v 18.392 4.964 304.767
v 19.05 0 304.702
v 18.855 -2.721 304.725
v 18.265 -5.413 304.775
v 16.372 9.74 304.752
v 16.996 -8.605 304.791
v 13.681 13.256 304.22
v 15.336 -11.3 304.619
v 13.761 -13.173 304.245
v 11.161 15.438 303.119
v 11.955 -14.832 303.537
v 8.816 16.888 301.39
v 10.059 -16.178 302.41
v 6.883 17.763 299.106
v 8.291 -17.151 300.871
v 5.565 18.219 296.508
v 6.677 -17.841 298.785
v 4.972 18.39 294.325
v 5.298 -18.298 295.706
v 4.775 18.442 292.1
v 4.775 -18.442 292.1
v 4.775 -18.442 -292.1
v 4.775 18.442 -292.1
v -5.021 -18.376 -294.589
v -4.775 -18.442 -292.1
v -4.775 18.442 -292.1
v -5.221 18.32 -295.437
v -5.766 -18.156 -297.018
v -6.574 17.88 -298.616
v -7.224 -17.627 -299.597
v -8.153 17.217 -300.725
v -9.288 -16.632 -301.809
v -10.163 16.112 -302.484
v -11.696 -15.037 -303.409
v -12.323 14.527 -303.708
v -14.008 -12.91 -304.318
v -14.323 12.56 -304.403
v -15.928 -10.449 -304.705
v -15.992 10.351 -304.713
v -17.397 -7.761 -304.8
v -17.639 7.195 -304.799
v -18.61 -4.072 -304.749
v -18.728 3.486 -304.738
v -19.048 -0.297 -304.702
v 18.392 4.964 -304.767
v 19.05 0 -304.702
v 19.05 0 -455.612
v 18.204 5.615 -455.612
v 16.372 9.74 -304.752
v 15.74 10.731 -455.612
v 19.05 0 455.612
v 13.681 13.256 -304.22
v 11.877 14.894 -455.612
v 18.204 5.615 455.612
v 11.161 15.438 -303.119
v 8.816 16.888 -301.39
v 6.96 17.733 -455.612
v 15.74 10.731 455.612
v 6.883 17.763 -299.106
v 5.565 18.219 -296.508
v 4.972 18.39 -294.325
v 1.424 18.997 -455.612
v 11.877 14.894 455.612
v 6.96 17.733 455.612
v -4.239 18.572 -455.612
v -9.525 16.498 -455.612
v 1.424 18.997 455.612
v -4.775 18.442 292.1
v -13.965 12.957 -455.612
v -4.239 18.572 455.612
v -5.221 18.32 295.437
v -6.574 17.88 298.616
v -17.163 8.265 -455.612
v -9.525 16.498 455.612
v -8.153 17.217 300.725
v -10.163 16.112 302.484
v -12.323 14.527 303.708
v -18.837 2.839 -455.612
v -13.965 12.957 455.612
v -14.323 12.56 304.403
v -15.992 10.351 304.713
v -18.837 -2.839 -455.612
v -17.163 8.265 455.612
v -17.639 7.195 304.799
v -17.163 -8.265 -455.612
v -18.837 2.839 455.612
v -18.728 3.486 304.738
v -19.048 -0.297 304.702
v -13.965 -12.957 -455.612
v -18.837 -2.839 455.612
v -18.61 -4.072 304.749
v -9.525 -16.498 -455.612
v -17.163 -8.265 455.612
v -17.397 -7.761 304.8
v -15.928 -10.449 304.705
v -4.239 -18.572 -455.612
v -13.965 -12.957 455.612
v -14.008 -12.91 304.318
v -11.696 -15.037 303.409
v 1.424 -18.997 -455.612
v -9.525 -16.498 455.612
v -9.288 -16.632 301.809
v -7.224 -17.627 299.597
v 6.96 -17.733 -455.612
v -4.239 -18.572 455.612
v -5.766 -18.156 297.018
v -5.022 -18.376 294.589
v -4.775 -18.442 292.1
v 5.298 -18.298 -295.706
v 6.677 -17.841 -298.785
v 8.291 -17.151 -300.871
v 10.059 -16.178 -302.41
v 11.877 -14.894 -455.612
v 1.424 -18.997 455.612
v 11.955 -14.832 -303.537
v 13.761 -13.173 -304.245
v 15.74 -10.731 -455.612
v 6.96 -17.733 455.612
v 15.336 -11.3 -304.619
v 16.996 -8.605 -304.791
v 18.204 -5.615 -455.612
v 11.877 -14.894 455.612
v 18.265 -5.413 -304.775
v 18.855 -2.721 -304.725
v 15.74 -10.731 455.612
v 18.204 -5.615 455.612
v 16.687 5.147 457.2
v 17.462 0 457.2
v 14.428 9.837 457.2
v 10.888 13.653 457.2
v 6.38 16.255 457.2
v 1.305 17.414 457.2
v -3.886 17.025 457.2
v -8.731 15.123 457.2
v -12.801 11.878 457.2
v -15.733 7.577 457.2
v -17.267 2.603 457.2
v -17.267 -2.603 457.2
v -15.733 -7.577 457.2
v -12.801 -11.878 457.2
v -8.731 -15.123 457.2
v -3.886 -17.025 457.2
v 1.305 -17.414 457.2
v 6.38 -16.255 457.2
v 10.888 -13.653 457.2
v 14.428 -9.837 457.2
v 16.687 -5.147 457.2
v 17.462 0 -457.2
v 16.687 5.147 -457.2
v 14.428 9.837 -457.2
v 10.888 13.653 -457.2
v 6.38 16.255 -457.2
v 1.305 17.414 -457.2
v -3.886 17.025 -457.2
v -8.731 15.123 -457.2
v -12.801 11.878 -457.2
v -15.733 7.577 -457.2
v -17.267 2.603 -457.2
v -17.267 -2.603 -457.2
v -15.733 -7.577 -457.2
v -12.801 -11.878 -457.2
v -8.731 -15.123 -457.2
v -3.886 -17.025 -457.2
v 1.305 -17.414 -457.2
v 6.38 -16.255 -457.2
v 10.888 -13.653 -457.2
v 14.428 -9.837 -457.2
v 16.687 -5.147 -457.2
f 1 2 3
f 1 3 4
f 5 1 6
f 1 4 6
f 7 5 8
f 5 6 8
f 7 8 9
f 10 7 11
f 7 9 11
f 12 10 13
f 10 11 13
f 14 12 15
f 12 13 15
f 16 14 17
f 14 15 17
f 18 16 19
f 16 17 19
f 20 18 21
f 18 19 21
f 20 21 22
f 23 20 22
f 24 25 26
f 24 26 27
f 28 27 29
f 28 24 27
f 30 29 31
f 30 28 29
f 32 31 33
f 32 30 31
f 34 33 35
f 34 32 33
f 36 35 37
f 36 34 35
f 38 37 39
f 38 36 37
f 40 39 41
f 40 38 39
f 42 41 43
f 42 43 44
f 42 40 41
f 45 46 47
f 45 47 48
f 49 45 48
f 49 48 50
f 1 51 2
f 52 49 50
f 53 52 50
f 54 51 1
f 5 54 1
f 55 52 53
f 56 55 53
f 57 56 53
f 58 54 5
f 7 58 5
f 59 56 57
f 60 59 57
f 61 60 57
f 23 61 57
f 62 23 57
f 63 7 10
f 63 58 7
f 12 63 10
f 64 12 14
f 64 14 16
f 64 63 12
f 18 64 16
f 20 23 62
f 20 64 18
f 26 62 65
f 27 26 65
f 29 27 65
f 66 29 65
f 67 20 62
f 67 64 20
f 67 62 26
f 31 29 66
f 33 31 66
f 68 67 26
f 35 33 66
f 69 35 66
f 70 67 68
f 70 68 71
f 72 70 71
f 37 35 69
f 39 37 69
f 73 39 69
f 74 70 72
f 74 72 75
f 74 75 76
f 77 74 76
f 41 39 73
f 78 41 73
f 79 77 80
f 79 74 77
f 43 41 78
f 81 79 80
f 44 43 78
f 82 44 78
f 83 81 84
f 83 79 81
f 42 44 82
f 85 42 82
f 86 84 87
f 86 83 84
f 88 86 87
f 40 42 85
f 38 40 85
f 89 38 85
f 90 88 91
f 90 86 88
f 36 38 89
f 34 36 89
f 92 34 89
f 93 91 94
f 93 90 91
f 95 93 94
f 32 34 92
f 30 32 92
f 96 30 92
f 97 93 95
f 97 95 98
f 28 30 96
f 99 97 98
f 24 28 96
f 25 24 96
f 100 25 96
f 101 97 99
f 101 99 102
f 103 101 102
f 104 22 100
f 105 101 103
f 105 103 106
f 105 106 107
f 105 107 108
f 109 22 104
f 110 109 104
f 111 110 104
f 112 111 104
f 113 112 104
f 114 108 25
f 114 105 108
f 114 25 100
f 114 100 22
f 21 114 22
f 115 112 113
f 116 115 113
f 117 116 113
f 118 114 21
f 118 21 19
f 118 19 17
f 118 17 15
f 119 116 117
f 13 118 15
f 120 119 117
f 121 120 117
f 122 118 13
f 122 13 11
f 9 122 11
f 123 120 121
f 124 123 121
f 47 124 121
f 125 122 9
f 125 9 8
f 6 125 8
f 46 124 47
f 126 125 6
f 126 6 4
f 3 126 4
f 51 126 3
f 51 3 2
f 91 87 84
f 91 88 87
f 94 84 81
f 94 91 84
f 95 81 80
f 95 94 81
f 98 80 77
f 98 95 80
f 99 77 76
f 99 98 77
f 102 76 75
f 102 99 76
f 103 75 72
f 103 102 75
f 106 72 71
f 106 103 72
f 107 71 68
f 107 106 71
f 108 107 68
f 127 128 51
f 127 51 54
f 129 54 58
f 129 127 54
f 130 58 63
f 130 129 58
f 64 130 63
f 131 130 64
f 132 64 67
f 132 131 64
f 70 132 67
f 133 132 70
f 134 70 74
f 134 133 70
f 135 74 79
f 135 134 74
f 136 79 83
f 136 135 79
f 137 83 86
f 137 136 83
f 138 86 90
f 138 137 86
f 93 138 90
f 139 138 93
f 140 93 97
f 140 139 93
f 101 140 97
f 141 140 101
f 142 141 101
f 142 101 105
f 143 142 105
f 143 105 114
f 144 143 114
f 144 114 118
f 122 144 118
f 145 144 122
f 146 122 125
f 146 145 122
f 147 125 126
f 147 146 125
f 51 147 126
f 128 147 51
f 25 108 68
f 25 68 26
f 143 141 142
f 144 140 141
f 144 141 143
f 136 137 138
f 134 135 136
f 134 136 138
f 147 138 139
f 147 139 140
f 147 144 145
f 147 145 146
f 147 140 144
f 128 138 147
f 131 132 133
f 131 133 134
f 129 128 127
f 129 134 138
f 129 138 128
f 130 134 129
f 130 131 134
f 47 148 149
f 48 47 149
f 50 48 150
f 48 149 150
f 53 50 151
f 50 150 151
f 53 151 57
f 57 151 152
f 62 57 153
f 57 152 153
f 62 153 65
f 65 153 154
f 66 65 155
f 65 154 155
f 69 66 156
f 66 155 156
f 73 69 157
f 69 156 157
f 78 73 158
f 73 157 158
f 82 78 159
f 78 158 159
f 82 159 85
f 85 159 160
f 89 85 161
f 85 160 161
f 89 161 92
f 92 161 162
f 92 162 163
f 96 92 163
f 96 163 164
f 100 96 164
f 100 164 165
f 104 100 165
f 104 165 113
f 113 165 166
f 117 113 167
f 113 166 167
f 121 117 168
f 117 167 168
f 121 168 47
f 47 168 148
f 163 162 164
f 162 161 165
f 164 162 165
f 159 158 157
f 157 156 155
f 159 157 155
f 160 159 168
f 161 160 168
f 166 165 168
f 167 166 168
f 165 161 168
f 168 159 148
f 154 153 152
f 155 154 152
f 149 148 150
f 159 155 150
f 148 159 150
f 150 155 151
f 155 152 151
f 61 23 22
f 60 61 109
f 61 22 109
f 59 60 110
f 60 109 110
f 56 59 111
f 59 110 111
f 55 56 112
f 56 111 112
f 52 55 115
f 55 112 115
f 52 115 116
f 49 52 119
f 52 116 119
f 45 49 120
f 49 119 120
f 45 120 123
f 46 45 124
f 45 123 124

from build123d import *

# Parameters (mm, degrees)
F0_R     = 19.05
F1_DEPTH = 457.2
F2_SIZE2 = 1.5875
F2_SIZE  = 1.5875
F4_DEPTH = 19.05


# Not quite as in the source:
# - a pattern or mirror of a feature is missing from the dataset's text; its kind, count and spacing are read off the source's solid


with BuildPart() as f1:
    # F0 (on Top) → F1 (new body, symmetric)
    with BuildSketch(Plane.XY):
        Circle(F0_R)
    extrude(amount=F1_DEPTH, both=True)

    # F2
    f2_edges = [f1.edges().sort_by_distance(p)[0] for p in [
        (-19.05, 0, 457.2),
        (-19.05, 0, -457.2),
    ]]
    chamfer(f2_edges, length=F2_SIZE, length2=F2_SIZE2)

    # F3 (on Front) → F4 (cut, symmetric)
    with BuildSketch(Plane.XZ):
        with BuildLine():
            Line((4.7752, 292.1), (4.7752, -292.1))
            ThreePointArc((4.7752, -292.1), (17.4752, -304.8), (30.1752, -292.1))
            Line((30.1752, -292.1), (30.1752, 292.1))
            ThreePointArc((30.1752, 292.1), (17.4752, 304.8), (4.7752, 292.1))
        make_face()
    f4 = extrude(amount=F4_DEPTH, both=True, mode=Mode.SUBTRACT)

    # F4_copies: F4 across plane
    add(f4.mirror(Plane(origin=(0, 0, 0), x_dir=(0, 0, -1), z_dir=(-1, 0, 0))), mode=Mode.SUBTRACT)


solid = f1.part
